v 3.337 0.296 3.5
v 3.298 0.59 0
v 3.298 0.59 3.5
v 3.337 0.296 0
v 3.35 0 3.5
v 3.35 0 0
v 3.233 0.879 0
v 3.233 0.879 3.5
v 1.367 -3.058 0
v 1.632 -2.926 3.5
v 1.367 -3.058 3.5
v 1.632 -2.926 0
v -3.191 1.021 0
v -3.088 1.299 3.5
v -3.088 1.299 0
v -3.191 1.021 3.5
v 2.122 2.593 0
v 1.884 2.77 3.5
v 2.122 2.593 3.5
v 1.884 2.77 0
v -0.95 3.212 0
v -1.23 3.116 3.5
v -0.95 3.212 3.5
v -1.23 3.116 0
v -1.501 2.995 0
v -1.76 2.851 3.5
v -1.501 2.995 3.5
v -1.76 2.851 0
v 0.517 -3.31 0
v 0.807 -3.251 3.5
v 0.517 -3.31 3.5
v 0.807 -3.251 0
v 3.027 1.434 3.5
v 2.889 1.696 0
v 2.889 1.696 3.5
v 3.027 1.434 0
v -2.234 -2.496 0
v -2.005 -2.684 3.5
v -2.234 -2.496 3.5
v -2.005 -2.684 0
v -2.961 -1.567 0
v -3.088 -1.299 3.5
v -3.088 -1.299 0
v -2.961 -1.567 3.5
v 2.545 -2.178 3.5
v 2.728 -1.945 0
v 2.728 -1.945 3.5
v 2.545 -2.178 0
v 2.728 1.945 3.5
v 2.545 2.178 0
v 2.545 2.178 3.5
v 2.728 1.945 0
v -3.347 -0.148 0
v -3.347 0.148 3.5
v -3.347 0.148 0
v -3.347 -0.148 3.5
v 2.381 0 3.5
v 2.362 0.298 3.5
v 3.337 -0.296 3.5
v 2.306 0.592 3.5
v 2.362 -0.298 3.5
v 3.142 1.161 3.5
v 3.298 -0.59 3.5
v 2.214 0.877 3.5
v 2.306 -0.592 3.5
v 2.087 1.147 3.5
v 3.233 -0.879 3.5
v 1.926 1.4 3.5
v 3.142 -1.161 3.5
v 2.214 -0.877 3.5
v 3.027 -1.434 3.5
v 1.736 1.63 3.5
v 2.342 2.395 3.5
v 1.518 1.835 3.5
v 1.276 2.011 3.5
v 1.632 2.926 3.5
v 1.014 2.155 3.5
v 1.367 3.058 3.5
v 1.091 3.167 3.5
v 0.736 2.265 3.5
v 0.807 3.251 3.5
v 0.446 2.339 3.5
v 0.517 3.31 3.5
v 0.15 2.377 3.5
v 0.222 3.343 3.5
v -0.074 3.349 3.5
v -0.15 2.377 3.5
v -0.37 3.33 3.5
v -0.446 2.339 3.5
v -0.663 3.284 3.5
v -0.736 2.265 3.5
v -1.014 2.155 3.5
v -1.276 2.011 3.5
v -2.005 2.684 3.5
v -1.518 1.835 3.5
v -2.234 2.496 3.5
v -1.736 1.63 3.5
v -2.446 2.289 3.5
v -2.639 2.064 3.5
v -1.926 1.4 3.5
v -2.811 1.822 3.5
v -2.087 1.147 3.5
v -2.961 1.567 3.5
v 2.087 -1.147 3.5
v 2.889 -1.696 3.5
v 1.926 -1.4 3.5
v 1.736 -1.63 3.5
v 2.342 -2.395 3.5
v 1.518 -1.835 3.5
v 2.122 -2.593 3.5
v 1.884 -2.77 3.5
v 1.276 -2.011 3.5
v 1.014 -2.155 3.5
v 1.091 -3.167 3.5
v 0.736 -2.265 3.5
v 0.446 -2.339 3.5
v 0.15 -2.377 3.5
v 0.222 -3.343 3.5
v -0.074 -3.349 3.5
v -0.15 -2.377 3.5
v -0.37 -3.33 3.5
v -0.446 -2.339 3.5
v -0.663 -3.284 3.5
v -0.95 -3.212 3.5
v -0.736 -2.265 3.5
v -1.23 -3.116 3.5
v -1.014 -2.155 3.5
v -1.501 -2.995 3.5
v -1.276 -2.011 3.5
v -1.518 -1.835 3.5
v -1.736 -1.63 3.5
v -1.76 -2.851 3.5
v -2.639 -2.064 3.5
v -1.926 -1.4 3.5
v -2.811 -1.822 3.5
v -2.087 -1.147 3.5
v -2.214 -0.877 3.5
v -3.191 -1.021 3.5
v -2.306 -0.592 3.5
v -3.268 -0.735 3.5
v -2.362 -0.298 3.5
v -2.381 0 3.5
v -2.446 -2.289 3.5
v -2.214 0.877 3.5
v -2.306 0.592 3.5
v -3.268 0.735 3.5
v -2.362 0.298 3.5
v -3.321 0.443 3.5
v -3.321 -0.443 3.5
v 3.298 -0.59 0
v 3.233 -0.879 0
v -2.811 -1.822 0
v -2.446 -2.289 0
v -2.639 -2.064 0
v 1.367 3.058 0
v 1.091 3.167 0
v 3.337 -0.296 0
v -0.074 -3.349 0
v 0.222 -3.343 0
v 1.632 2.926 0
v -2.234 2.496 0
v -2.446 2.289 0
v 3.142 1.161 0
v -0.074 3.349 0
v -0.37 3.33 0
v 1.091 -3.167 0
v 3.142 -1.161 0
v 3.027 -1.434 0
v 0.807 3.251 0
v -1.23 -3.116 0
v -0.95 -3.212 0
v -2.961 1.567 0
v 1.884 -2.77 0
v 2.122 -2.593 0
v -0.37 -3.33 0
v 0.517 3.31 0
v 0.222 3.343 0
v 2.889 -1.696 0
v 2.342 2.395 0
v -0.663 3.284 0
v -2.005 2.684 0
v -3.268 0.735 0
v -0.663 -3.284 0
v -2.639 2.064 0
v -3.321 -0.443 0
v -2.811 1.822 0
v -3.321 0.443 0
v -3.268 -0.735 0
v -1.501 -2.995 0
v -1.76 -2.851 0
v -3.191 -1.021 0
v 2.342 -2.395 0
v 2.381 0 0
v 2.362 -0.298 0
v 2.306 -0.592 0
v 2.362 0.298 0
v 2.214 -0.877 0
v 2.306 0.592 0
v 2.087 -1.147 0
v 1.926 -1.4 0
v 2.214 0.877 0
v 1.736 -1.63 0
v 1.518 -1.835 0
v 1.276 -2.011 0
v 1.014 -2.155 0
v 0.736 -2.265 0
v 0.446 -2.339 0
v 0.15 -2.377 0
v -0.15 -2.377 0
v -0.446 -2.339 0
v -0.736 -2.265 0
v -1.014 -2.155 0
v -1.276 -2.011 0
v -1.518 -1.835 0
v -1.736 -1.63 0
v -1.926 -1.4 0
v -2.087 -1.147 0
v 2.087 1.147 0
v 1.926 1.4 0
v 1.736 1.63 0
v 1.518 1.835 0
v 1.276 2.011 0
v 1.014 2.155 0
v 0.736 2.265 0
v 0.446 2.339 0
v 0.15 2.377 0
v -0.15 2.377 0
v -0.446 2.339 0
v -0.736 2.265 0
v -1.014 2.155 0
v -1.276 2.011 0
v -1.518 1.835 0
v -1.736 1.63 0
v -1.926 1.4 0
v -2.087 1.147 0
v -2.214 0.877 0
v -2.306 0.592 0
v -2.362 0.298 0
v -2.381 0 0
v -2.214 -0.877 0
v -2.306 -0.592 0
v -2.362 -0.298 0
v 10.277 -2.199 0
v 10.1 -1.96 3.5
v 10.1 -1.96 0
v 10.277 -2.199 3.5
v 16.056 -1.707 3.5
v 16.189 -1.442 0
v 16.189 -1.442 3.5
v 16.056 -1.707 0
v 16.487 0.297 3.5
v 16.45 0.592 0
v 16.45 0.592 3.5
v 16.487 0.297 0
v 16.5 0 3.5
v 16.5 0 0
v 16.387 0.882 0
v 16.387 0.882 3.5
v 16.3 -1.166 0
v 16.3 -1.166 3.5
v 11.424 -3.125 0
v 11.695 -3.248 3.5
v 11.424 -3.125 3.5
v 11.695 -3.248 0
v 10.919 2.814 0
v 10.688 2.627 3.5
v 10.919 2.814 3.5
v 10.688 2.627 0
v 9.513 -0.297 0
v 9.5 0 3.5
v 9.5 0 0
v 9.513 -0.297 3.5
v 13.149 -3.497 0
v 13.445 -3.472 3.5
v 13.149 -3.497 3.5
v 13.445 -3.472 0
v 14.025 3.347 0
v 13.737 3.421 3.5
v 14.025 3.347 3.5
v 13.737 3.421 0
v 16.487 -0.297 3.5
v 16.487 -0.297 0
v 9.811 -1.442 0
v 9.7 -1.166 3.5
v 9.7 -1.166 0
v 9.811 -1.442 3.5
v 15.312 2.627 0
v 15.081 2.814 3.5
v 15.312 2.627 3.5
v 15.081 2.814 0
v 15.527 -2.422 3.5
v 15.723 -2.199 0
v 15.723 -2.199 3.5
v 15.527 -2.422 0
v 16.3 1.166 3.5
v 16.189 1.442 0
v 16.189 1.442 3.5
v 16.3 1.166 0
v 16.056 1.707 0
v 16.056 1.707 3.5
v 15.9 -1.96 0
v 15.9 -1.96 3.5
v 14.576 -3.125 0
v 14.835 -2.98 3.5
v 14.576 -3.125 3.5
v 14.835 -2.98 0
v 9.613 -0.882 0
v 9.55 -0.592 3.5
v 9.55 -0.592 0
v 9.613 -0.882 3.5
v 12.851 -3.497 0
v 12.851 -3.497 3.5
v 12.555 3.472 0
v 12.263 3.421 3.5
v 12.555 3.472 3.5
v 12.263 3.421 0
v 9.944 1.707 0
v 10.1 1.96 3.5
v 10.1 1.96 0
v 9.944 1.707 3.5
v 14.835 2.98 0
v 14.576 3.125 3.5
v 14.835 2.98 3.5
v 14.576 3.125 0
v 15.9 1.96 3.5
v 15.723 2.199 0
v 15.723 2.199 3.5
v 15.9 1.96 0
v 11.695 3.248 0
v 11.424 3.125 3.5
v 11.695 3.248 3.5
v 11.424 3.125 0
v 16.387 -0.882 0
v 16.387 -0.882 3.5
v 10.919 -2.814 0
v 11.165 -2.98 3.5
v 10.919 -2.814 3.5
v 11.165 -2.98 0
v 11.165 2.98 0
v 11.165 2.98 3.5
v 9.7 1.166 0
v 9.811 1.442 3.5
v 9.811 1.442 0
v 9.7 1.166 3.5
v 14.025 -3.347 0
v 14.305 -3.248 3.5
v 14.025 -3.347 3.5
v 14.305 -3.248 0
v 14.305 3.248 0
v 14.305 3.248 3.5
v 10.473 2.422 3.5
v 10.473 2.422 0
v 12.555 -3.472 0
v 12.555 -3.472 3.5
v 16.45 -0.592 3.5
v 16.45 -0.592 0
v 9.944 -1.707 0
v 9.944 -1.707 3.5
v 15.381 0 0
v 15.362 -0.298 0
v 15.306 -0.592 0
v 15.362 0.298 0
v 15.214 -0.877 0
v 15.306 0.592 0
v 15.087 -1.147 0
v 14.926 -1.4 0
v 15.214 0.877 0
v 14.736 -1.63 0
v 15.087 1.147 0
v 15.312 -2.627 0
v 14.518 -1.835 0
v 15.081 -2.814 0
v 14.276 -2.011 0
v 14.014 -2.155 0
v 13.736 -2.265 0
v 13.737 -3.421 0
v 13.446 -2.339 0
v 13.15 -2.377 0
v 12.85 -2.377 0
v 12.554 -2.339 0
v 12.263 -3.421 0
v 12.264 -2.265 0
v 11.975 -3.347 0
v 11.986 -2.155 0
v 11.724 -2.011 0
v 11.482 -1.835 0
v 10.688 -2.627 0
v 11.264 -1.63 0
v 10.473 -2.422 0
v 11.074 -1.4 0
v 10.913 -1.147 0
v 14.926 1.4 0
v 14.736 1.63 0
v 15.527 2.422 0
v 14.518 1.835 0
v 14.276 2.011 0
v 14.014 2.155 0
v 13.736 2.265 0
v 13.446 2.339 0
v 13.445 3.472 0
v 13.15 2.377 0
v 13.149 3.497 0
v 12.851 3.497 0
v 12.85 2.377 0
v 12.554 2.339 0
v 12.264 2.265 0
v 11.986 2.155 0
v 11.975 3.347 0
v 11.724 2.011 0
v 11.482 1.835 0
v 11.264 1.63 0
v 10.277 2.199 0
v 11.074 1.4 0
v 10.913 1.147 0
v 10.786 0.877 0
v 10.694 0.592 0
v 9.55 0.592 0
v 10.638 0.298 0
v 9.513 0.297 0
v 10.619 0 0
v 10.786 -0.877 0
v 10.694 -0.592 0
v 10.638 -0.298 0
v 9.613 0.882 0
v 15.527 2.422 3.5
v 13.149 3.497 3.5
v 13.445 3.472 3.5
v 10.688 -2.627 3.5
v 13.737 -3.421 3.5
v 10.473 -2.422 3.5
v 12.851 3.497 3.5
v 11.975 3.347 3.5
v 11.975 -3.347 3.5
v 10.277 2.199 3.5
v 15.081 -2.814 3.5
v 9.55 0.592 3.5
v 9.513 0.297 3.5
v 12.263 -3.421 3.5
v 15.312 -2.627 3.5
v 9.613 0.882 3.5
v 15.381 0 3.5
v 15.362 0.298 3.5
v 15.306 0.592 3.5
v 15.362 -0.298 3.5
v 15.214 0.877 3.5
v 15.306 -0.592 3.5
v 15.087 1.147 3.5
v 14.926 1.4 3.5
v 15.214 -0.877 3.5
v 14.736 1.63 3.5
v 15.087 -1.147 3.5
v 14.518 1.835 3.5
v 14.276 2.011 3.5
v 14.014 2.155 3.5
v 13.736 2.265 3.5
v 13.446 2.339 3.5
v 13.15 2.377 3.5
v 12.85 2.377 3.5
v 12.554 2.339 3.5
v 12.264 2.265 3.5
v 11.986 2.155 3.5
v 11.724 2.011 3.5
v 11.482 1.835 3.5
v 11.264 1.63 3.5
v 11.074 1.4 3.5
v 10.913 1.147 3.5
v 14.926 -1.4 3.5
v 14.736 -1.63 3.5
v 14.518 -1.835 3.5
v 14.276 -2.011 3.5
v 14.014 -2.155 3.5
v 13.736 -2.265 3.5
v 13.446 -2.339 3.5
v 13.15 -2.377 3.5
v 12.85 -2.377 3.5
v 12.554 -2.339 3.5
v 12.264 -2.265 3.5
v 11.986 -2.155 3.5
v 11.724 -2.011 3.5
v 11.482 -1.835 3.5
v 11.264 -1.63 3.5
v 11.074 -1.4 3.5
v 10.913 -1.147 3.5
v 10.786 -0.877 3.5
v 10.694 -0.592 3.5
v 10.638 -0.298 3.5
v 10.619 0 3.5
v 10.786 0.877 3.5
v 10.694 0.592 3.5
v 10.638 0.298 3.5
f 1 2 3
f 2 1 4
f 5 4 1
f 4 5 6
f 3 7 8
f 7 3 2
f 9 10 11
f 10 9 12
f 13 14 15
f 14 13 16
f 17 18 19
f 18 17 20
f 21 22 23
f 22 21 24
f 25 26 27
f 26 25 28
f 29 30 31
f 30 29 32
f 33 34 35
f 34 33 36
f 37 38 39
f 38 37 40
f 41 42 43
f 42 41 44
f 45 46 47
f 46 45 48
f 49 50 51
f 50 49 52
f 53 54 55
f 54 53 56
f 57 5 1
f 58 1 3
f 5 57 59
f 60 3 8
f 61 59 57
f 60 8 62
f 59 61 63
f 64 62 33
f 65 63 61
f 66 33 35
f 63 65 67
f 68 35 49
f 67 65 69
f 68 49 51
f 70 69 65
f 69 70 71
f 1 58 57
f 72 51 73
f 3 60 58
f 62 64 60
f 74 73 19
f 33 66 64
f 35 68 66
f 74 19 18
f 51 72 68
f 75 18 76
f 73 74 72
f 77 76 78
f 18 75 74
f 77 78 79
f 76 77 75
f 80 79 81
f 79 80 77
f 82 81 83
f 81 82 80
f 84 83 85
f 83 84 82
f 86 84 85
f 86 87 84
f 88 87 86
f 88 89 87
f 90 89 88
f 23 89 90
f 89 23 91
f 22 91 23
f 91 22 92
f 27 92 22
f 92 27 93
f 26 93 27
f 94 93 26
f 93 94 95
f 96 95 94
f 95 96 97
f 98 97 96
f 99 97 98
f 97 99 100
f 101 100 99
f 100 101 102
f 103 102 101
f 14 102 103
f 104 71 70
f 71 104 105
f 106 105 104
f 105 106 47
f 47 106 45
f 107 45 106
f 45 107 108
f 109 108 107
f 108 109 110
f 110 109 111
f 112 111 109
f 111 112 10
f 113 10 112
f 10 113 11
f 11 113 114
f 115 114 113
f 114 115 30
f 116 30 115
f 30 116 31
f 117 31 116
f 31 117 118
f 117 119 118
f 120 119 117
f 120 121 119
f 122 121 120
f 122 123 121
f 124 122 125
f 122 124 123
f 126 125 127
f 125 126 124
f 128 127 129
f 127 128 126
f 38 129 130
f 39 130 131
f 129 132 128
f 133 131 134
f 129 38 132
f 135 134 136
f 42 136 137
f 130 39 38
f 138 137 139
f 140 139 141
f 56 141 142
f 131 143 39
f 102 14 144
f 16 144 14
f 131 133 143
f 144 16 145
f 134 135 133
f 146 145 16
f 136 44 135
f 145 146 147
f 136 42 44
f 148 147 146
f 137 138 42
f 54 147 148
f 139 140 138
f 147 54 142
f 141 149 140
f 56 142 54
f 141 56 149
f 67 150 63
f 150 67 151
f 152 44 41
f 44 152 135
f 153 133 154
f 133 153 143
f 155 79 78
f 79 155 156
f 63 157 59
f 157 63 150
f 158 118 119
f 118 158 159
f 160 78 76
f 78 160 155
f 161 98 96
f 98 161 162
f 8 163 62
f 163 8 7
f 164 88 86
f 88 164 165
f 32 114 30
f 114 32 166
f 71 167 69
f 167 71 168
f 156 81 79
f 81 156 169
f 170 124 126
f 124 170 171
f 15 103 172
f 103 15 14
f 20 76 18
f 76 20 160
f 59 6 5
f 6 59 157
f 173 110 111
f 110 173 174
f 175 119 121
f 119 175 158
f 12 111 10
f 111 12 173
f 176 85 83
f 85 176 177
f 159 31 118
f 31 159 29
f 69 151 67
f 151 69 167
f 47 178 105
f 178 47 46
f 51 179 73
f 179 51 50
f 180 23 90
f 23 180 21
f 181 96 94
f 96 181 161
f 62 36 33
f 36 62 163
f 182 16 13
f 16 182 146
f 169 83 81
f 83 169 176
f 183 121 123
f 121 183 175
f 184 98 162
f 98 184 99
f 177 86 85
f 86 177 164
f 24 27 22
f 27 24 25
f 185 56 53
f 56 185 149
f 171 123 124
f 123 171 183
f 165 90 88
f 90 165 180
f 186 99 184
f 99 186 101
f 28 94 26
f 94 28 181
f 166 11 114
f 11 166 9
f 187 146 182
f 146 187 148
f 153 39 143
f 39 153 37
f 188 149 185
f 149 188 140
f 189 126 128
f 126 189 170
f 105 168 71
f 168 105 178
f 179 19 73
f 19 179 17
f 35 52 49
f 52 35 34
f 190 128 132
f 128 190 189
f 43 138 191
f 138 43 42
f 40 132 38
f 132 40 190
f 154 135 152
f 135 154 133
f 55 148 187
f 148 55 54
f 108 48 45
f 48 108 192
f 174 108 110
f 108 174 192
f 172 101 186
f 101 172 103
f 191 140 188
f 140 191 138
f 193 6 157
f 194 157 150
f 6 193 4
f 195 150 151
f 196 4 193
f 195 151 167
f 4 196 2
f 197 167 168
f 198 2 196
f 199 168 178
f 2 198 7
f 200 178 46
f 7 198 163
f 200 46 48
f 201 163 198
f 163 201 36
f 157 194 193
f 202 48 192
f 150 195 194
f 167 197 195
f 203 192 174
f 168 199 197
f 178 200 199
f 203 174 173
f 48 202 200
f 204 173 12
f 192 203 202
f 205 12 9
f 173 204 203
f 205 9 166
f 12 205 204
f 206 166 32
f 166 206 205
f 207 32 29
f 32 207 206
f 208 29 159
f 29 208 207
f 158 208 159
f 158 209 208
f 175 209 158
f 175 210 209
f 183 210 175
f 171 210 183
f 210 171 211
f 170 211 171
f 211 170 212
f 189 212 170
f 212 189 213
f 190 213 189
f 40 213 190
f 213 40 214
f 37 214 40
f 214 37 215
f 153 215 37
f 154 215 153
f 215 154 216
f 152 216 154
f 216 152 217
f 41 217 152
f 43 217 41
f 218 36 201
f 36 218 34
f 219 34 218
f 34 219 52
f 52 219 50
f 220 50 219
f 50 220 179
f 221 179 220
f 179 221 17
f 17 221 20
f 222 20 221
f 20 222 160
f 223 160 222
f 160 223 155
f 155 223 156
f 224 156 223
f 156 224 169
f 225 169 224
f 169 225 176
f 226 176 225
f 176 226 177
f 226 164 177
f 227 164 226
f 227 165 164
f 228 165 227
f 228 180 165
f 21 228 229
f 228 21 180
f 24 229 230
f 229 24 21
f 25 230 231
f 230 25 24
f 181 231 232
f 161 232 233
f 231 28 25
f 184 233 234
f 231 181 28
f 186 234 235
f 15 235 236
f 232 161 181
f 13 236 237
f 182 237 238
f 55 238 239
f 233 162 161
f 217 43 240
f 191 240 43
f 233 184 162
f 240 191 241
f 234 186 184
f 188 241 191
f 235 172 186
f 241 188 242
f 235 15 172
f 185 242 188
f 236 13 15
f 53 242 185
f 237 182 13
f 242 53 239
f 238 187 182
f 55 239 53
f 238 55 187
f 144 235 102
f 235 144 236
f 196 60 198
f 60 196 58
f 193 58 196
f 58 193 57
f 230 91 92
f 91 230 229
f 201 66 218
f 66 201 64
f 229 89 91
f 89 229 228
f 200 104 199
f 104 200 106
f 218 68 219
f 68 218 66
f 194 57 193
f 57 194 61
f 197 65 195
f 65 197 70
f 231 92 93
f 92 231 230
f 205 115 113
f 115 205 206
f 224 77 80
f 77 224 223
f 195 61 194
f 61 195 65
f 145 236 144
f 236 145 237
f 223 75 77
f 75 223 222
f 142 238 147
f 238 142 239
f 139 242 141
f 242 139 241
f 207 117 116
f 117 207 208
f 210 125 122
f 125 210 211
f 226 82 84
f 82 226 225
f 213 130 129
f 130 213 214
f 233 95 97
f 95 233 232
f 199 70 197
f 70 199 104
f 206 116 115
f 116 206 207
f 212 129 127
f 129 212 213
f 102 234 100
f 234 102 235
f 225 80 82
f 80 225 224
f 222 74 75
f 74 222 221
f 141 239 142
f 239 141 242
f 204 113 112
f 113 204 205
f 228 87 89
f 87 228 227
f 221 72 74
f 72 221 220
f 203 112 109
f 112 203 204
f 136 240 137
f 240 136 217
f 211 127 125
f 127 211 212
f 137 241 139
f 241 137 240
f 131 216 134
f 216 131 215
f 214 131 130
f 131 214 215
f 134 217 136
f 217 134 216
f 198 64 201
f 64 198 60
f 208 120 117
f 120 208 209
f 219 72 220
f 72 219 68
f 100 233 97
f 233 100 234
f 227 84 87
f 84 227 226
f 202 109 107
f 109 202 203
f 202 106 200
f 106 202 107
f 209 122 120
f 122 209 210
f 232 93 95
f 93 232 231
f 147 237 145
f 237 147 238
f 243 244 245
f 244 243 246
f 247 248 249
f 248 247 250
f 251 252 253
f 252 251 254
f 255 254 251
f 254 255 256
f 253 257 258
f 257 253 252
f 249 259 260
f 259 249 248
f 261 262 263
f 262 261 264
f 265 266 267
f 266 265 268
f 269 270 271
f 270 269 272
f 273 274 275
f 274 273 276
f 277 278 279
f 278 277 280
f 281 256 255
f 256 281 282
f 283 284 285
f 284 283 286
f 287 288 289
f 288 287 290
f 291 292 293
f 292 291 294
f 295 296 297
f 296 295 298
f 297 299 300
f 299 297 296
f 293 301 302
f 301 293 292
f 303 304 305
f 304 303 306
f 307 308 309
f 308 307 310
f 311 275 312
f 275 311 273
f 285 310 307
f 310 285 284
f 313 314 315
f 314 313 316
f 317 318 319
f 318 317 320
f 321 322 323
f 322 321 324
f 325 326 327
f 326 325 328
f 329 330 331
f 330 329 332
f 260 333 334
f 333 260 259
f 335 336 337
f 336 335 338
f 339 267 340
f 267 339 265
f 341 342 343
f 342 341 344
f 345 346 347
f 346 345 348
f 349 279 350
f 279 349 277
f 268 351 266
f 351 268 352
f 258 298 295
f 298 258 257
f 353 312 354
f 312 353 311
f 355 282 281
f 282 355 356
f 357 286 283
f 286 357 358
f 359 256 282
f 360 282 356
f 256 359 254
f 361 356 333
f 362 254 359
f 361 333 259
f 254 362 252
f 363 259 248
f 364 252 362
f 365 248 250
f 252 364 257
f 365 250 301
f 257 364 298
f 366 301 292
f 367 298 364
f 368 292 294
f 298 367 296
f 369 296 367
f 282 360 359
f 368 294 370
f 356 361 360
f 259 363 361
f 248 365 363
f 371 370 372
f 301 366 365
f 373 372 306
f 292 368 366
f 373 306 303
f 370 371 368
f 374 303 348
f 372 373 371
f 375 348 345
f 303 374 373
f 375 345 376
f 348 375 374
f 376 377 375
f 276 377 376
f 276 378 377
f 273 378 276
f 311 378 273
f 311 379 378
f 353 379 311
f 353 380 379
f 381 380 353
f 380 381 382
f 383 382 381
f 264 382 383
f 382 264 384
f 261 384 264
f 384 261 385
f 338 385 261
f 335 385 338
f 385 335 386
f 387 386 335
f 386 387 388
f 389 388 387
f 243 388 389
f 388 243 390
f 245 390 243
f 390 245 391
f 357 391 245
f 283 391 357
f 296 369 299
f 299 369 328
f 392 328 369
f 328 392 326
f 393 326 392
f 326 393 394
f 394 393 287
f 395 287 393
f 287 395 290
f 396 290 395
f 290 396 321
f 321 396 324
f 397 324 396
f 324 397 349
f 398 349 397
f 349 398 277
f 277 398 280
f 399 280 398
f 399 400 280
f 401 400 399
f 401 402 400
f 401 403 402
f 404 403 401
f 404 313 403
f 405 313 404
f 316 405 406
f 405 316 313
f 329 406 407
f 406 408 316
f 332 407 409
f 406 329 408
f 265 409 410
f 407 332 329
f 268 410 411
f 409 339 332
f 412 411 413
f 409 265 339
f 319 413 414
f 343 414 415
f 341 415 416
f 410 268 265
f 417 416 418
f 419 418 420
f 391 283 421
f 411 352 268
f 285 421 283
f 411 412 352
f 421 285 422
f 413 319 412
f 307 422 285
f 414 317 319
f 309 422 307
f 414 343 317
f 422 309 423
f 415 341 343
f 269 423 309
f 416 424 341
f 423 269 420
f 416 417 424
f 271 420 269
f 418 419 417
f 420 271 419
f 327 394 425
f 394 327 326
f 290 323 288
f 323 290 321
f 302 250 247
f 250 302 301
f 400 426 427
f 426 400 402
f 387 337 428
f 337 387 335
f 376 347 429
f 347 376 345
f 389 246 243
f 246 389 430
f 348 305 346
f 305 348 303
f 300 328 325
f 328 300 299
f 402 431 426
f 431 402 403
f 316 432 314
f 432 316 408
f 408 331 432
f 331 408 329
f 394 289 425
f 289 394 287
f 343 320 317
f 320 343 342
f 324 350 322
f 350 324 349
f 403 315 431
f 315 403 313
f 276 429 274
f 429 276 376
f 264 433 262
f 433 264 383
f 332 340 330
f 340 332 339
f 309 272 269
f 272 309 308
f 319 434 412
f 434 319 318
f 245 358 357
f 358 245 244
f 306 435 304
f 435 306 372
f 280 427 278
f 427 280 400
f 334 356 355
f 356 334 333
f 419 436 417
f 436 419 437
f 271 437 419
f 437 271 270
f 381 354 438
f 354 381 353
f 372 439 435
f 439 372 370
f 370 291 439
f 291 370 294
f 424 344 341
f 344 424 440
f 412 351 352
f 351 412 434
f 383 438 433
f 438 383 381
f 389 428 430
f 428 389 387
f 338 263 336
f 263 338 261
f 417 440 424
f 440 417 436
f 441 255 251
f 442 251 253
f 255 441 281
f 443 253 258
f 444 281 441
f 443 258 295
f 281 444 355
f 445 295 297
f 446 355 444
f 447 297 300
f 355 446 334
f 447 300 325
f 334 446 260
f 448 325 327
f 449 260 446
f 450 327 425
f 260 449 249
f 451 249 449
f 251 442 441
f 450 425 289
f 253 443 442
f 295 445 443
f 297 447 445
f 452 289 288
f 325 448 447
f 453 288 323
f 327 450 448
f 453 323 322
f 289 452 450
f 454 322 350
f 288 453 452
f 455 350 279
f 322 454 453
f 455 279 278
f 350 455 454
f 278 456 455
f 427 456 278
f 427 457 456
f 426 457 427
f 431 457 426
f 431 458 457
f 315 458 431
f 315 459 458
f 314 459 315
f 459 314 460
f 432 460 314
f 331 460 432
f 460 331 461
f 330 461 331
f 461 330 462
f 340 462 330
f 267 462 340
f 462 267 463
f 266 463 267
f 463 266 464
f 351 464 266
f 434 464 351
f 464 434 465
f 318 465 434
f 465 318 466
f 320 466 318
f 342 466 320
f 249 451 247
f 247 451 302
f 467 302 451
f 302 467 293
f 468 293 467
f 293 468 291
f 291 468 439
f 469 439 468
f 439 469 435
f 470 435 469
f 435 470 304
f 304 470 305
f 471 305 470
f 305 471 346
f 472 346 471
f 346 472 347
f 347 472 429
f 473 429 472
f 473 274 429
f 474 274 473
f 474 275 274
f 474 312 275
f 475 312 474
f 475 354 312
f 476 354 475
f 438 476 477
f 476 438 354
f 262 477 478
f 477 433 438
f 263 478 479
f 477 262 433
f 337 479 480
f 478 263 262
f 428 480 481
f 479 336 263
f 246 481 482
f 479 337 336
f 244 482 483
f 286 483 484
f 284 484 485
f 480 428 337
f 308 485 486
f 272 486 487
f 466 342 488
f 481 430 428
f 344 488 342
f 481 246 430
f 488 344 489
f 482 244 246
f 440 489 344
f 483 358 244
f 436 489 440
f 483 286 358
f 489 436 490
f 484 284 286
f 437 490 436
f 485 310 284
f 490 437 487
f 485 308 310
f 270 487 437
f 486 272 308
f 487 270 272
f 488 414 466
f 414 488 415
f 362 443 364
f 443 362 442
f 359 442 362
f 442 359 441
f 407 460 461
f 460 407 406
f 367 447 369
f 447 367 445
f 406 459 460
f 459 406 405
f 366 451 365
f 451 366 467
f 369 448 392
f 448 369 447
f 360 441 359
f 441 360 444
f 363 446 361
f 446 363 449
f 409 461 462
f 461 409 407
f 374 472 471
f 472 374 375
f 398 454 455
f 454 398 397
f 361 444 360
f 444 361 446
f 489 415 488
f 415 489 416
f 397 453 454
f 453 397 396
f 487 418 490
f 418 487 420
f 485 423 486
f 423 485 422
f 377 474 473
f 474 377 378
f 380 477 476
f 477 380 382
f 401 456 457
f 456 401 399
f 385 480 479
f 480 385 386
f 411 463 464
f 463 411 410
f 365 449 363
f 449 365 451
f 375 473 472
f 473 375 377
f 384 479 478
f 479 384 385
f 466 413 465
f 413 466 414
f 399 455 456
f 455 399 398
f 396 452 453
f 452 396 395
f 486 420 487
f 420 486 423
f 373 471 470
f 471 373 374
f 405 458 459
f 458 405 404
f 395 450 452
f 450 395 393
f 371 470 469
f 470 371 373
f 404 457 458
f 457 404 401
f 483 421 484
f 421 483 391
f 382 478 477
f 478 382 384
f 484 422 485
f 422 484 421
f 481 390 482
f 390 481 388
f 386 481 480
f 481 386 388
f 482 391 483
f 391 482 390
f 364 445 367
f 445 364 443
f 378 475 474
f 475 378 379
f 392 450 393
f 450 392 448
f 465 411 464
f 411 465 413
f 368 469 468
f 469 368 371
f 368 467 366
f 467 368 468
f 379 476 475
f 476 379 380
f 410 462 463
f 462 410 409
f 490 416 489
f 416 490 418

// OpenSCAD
$fa=.01;
$fs=.3;

id = 3/16*25.4;
od_list= [6.8,7.1];
h=3.5;

for(i=[0,1]){
	od=od_list[i]-.1;
	translate([i*(od+6),0,0])
	difference(){
		cylinder(h=h,d=od);
		translate([0,0,-1]) cylinder(h=h+2,d=id);
	}
}
